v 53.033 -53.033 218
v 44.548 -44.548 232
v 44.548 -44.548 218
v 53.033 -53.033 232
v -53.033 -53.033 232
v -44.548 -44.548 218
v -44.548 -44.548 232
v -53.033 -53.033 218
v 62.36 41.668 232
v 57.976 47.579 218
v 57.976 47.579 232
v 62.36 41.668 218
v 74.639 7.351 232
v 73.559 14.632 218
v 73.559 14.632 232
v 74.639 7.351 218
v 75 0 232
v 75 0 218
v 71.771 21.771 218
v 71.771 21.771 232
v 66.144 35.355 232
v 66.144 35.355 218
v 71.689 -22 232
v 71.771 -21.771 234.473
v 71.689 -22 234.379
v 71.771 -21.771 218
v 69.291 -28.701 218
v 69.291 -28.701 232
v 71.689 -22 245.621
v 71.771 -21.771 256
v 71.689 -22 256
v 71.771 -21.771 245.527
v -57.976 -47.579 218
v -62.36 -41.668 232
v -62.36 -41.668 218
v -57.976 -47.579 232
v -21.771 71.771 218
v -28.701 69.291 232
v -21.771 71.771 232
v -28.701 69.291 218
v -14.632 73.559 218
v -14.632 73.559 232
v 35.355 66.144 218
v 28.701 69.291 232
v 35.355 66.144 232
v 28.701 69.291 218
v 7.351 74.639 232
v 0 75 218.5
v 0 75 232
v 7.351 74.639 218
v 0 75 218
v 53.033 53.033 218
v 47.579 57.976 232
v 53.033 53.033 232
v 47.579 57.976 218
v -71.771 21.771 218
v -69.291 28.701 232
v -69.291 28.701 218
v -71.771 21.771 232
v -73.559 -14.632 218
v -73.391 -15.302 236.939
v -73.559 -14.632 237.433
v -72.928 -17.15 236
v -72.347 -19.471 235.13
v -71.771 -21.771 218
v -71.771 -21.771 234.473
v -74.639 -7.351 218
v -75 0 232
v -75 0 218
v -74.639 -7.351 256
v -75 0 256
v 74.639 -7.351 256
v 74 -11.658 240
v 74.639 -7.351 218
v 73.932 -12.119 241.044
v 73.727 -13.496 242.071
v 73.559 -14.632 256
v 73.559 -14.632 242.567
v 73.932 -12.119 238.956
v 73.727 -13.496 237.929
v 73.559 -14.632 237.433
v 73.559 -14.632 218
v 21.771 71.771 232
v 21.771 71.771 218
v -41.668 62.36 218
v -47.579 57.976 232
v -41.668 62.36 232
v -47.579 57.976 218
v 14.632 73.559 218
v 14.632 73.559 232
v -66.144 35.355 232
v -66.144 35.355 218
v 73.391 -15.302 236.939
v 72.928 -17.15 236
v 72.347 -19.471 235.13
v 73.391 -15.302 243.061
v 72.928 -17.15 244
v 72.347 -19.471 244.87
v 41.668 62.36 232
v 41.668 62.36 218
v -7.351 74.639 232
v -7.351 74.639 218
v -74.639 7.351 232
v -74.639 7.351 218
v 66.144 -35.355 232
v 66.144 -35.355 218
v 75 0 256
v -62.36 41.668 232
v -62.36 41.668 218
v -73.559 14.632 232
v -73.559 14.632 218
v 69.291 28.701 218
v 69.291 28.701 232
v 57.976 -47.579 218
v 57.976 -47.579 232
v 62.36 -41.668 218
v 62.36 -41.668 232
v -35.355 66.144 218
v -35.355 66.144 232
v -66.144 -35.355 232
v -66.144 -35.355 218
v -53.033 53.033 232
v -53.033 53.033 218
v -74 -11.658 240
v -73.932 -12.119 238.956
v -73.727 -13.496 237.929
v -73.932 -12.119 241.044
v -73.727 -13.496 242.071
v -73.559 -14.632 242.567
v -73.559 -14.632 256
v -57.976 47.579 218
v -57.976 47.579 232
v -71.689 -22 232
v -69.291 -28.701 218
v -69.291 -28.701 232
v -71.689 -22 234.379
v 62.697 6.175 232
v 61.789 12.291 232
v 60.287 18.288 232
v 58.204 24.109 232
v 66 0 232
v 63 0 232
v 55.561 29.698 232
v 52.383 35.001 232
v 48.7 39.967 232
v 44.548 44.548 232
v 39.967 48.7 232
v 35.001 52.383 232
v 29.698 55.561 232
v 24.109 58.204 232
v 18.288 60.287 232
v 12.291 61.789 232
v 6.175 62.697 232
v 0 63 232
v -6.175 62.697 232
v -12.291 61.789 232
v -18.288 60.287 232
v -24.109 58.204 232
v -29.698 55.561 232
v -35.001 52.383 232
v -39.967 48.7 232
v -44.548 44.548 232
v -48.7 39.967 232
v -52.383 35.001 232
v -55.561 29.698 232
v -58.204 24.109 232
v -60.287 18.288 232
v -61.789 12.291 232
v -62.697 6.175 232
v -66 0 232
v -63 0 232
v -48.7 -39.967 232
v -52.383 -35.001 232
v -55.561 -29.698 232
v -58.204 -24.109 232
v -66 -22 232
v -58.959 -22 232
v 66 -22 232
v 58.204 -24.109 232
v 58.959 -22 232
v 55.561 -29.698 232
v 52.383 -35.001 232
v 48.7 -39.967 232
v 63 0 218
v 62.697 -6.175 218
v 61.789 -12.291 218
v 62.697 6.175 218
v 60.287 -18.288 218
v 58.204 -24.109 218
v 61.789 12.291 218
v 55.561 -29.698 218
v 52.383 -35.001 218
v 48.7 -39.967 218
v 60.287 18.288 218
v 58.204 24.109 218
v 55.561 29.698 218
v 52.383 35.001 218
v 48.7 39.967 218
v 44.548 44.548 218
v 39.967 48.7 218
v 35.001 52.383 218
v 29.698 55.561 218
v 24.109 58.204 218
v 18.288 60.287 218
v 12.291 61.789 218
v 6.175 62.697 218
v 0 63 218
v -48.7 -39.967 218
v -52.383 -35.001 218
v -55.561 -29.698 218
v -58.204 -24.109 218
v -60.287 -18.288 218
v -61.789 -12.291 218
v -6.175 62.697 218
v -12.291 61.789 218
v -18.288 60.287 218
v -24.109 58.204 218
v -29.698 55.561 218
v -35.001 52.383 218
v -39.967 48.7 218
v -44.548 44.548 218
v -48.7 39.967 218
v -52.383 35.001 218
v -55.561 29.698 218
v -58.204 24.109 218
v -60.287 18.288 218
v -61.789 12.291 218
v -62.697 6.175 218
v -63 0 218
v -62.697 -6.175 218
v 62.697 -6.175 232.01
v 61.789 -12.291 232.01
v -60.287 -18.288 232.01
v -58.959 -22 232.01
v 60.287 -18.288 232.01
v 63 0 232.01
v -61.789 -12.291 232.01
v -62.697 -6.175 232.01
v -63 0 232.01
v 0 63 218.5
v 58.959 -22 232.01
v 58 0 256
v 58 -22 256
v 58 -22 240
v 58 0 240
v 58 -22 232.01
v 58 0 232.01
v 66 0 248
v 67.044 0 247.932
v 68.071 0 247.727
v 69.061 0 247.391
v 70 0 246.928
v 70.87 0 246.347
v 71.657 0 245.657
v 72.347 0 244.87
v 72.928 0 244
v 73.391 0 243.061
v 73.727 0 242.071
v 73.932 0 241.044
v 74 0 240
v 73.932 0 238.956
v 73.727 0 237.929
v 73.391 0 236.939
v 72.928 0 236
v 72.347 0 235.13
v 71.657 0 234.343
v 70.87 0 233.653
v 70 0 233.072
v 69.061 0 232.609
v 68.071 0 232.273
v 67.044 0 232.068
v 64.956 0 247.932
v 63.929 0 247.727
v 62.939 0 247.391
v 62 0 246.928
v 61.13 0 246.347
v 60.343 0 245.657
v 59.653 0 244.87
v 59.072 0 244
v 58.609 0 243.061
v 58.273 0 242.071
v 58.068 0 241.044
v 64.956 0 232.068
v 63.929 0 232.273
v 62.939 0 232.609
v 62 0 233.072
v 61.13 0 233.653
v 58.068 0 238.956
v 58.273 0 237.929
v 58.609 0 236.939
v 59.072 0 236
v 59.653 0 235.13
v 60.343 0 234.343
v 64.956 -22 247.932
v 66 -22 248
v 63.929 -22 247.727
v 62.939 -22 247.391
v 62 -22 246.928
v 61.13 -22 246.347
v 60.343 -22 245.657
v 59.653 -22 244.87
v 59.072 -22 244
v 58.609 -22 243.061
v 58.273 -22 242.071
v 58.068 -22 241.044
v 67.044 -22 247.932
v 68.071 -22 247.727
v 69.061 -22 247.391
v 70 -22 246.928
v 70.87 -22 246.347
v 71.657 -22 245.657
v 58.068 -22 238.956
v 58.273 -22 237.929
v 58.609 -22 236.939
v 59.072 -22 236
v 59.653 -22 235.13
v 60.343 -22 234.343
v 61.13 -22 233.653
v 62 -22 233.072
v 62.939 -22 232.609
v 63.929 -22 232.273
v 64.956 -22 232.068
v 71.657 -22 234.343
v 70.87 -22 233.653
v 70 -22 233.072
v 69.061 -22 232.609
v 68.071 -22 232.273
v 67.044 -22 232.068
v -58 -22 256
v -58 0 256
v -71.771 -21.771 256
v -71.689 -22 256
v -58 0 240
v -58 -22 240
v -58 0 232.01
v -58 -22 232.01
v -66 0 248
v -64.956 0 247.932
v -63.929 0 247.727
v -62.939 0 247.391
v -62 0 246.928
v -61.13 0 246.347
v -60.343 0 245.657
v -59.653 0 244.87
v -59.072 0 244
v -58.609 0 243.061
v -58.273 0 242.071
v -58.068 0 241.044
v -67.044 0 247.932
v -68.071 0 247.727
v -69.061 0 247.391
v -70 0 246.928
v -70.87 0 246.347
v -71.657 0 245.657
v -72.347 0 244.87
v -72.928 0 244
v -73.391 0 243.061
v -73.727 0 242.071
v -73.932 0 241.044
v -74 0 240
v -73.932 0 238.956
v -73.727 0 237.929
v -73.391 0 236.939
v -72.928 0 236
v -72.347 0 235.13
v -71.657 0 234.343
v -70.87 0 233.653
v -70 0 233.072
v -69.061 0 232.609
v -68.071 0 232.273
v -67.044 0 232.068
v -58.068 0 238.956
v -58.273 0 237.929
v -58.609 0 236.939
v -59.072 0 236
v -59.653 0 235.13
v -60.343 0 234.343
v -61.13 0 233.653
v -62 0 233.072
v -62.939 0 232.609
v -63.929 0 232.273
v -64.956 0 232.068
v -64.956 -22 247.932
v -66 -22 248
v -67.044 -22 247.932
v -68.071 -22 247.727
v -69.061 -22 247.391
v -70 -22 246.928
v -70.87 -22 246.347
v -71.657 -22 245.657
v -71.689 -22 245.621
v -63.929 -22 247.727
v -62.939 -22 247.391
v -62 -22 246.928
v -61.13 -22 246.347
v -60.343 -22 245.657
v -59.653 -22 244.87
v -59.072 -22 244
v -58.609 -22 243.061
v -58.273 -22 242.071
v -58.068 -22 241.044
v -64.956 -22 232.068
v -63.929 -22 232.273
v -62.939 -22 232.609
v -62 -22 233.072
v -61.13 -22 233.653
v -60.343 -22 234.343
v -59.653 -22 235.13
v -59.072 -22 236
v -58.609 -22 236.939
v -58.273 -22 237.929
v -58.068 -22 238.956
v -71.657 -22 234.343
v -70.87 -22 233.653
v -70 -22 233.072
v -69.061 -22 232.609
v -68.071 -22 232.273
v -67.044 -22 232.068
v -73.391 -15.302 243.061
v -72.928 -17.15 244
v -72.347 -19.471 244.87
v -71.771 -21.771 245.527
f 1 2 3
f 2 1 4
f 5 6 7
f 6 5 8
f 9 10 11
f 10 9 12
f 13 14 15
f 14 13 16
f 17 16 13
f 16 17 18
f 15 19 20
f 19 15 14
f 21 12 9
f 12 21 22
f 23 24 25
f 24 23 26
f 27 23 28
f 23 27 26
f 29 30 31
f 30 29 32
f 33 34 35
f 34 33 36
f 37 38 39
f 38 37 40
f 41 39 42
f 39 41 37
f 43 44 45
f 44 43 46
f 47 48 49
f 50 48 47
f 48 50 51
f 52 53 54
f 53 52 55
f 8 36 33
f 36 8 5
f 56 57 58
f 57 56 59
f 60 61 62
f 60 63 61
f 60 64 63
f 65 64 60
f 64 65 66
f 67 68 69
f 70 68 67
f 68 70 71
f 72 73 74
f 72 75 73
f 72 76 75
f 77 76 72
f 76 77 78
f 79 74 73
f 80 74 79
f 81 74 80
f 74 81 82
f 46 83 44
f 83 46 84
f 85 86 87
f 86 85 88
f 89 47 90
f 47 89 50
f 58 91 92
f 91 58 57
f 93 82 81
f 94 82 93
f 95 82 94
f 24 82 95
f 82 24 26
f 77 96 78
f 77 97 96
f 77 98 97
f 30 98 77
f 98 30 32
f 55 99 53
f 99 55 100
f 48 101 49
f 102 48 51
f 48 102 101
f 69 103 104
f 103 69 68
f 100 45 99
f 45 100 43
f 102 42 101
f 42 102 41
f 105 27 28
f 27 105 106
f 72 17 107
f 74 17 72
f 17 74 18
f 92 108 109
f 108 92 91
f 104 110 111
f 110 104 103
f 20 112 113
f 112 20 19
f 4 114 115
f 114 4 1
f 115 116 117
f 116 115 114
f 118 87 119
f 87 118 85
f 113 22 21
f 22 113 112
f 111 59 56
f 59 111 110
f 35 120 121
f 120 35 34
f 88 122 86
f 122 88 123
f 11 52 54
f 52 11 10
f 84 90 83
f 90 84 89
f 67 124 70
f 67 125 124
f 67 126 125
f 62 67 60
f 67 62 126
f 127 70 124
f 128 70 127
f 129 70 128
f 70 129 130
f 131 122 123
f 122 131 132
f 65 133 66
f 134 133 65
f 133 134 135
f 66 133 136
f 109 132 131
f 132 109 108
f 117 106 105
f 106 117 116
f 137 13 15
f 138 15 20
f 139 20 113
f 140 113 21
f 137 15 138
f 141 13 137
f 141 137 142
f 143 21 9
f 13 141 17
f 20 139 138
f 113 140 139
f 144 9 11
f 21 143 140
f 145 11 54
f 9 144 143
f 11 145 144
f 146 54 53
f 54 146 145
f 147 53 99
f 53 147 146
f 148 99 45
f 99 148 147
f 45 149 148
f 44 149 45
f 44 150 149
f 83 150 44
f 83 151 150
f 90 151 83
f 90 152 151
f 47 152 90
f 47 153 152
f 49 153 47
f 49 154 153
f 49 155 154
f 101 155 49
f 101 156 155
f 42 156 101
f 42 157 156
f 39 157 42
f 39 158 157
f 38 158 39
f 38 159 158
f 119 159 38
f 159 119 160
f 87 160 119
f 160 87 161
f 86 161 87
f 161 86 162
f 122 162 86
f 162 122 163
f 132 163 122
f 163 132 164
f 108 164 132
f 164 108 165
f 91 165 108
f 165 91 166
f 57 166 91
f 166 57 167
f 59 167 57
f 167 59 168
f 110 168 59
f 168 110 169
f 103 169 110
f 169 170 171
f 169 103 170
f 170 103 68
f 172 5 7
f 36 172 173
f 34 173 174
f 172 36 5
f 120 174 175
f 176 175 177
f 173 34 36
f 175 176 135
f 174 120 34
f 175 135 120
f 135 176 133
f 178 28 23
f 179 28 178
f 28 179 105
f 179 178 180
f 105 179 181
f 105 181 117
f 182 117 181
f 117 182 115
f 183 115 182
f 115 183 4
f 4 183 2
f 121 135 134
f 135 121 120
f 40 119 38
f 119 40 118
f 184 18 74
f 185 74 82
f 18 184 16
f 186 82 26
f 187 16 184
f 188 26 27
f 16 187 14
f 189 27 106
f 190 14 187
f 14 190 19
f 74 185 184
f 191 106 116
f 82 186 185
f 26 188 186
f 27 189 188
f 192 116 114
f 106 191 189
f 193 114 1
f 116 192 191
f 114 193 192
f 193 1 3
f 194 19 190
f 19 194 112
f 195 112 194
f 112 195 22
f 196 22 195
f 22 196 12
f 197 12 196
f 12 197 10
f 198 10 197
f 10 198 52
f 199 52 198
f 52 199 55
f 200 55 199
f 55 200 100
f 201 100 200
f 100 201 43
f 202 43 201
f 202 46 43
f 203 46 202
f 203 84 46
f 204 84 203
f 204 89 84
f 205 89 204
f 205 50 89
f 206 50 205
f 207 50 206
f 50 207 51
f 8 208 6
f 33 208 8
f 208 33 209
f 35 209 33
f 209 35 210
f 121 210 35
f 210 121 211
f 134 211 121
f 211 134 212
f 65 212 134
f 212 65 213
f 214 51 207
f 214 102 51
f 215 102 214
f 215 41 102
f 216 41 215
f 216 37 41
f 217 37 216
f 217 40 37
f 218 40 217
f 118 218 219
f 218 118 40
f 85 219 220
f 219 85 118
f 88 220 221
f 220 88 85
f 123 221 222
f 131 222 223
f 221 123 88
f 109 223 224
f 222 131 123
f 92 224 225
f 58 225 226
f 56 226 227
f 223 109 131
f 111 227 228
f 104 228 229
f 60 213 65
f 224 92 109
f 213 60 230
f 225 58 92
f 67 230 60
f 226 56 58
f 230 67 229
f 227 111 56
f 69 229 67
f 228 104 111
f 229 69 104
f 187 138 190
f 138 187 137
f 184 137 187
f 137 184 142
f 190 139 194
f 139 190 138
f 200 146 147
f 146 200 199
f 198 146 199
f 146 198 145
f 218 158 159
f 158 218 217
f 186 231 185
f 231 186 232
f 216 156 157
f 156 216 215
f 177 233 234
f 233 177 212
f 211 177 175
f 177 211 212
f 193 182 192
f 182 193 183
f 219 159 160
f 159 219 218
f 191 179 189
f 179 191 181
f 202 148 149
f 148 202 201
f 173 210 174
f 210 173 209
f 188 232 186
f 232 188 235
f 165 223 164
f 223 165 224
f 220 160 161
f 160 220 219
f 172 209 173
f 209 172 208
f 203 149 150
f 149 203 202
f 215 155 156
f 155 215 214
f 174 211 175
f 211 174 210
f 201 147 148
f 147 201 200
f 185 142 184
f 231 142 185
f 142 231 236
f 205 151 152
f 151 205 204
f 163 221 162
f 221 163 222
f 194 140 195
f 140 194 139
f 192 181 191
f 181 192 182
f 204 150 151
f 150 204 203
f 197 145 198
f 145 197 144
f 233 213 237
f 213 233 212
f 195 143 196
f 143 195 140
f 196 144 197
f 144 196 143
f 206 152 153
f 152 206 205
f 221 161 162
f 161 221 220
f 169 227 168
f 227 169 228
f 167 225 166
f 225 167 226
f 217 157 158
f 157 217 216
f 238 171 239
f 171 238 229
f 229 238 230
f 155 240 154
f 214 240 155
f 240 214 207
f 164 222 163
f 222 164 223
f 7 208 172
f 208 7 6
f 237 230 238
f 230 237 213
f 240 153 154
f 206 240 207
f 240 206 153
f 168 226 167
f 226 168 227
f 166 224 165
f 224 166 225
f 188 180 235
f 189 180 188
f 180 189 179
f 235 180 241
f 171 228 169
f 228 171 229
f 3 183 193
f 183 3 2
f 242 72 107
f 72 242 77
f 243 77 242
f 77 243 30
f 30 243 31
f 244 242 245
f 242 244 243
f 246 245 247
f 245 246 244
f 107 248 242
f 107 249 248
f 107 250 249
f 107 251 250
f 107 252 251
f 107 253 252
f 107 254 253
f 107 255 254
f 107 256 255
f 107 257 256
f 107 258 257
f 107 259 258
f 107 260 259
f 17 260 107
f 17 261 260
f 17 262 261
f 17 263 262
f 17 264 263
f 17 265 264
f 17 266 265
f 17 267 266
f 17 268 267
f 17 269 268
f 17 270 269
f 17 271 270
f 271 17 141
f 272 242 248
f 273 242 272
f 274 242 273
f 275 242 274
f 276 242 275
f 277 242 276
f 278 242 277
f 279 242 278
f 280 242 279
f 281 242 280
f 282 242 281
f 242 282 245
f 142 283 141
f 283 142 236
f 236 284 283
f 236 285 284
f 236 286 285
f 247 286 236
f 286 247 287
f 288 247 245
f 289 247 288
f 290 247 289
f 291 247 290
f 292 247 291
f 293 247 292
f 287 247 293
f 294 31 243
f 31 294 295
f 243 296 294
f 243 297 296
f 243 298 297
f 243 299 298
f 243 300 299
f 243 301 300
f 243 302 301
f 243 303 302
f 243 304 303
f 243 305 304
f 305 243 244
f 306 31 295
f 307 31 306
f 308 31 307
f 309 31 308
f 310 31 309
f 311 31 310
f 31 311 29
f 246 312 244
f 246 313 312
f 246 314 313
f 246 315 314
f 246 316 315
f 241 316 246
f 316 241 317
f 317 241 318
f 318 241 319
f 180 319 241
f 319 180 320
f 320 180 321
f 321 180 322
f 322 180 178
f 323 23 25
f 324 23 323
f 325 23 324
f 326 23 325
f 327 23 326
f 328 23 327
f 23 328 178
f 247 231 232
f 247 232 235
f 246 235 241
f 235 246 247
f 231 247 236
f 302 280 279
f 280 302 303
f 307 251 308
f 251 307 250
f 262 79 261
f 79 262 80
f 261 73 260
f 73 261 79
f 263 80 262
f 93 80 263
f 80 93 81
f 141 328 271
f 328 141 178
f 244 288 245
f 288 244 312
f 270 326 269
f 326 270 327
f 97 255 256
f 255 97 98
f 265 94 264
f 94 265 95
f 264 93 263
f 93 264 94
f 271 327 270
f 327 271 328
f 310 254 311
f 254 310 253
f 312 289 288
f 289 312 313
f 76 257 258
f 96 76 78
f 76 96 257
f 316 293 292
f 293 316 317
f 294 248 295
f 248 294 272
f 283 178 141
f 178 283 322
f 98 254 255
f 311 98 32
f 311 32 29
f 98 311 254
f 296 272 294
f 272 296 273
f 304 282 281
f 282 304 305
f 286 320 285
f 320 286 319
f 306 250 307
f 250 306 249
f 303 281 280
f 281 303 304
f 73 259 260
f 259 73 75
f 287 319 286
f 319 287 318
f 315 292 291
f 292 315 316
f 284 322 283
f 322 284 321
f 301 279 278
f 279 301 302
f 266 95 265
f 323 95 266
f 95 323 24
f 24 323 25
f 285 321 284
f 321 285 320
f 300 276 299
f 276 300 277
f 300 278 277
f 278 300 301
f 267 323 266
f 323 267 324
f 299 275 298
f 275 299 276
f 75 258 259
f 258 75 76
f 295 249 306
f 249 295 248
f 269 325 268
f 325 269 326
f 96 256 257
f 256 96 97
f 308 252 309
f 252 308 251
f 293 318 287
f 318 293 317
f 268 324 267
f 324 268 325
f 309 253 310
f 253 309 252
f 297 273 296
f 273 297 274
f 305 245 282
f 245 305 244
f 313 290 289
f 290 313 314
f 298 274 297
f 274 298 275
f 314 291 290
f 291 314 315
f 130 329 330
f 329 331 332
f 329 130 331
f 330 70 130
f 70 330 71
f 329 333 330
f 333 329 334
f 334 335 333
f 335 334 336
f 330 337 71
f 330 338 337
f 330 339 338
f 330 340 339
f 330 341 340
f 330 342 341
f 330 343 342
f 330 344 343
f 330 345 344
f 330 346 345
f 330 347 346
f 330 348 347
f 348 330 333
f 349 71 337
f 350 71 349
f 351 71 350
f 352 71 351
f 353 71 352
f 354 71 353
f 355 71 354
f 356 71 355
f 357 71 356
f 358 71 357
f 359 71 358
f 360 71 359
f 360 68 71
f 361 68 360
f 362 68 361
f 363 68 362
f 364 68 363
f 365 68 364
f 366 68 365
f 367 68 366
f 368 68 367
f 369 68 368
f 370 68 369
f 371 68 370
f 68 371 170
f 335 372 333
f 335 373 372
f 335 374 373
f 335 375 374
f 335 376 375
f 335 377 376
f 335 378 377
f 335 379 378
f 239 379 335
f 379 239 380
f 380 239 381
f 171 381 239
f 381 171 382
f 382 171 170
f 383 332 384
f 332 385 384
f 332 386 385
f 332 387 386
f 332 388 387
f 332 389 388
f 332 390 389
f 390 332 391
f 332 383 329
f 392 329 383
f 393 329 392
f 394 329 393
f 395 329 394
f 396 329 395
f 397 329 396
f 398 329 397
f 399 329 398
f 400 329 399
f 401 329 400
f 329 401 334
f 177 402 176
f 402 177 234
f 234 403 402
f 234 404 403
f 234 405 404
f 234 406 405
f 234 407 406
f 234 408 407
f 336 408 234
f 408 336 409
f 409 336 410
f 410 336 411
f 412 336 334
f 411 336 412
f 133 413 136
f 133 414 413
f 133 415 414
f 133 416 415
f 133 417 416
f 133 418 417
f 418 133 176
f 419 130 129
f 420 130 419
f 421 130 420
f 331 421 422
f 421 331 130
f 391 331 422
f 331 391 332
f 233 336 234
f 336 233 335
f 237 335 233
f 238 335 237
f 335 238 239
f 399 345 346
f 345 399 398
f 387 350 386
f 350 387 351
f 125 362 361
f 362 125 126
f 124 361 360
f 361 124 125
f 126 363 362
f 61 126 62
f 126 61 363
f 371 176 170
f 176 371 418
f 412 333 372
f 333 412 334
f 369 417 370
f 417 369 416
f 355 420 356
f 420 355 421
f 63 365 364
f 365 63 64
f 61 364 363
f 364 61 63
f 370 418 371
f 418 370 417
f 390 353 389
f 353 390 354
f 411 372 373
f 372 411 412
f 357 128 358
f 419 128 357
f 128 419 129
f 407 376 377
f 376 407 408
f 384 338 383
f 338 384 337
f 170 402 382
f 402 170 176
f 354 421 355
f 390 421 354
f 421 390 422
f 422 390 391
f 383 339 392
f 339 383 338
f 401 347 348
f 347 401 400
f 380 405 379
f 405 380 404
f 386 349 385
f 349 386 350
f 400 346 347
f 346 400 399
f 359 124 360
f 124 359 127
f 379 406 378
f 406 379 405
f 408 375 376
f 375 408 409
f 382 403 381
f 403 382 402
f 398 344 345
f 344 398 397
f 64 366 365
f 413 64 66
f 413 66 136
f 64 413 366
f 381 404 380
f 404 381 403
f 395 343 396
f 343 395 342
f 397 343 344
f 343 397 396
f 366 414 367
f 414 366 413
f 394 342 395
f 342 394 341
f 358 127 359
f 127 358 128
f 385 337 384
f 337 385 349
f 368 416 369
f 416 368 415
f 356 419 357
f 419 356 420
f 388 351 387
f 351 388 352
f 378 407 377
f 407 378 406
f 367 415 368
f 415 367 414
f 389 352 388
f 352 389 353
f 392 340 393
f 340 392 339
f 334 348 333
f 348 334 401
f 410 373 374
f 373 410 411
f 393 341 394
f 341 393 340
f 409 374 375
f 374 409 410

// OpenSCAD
// =====================================================================
// child_top_crown.scad — 子機 トップクラウン (吊り耳 ×2 一体 + ドーム根元カラー)
//
// docs/子機外装_改善要件.md §3.5 (G2/G4, C3)。`child_lug` ×2 を置き換える。
// コアフレームの吊り耳ボス (頂面 z=218、M5 熱圧入インサート ×4 @ x=±lug_x,
// y=lug_bolt_y) に M5 ×4 で載る。ドーム押えリング (wte4_dome_cap, OD=dome_ring_od
// 仮 120.3、座面 z=208) を囲む C 形カラーと、左右の吊り耳 (シャックル Ø16) を
// 一体化した部品。**ドーム上半球は覆わない** (C3, 将来 LED で照らす)。
//
// 座標系: 機体グローバル (チューブ軸=Z, z=0 チューブ下端, +Y=前)。
// 取合い (二重定義。child_core_frame.scad と一致させること):
//   lug_x = 66 / lug_bolt_y = [-4,-16] / 台座取付面 z = 218 (frame_z1)
//   dome_ring_od = 120.3 (child_core_frame / child_jaw_gate と同じ仮値)
//   パイロン屋根 y -101..-50 / z 182..190 (child_core_frame, 干渉しない高さ差)
//   xdcr_socket 座 中心 (0, -75)、外径 ~36 (r18) 高さ38 → 上端 z228
//     (child_core_frame xd_cy / xd_p, xdcr_socket.md)
// ゲート (可動側、y>=0) 頂面も z218 なので、y>0 領域は z>=218.5 に浮かせて
// 開閉時に擦らないようにする。
//
// 荷重: L1 吊り 99N/耳 (全備 5.7kg x 3g, ブライドル ~30°) / L2 輸送 300N
// (2026-09-04 緩和, 5g)。quick_strength で確認 (このファイル末尾コメント参照)。
//   lug  (シャックル穴 ベアリング/ネット断面/ティアアウト): hole16 edge10 t22
//     F=300N -> 0.68/0.85/0.68 MPa (limit 12/18/7.2) PASS
//     F=99N  -> さらに余裕 PASS
//   beam (耳根元 曲げ、L=22 (根元→シャックル穴中心), b=22(y), t=17(x)):
//     F=300N -> 曲げ 6.23 MPa (limit 12) / たわみ 0.127mm (limit 1) PASS
//     F=99N  -> PASS (さらに余裕)
//   ※ シャックル穴中心は当初案 z=248 から z=240 に下げてある。z248/Φ16 だと
//     穴の上端がちょうど耳上端 z=256 と一致し実質マージン 0 になるため
//     (child_lug の assert はこの base_t 二重加算バグで見かけ上 8mm と出ていた)。
//     z=240 なら上端マージン 8mm・下端 (台座天面 z=222) までも 10mm 確保できる。
//
// 印刷: 左右の耳は .scad 内で mirror([1,0,0]) して 1 部品 (STL 1 個) にまとめて
// ある (placement.json ではミラー不要、1 インスタンスを配置するだけでよい)。
// カラー (単独円環) は +Z 直立で層がフープ荷重に沿う。耳板のシャックル穴軸=Y・
// 主荷重(Z 方向近似)は層面内にならないので、耳の根元断面は layer-across
// (量子 12MPa) で評価している (十分な安全率で PASS、上記コメント参照)。
// 1 部品で印刷 (+Z up)。耳の張り出しは下部が r63..75 の環状部に連続しており
// オーバーハングは目視で確認 (printability.py 参照)。
// =====================================================================

/* [取付 (child_core_frame と二重定義)] */
lug_x      = 66;          // 耳ボルト列の x (±)
lug_bolt_y = [-4, -16];   // M5 ×2 (机体 y)
mount_z    = 218;         // 台座取付面 (= frame_z1)

/* [ドーム根元カラー] */
dome_ring_od = 120.3;      // 押えリング OD (仮。child_core_frame/child_jaw_gate と同じ)
r_in       = 63;           // カラー内径 = Ø126
r_out      = 75;           // カラー外径 = Ø150 (<= 152 上限)
ring_z0    = 218;          // カラー下端 (機体固定側、y<=0)
ring_z1    = 232;          // カラー上端 (高さ 14)
front_raise = 0.5;         // y>0 (ゲート側) は下端をこれだけ浮かせる
aft_az0    = 225;          // 後方カットアウト (xdcr_socket 逃げ) 開始方位角
aft_az1    = 315;          // 終了方位角 (-Y ±45°)

/* [xdcr_socket / パイロン 逃げ確認用 (child_core_frame と二重定義)] */
xd_cx      = 0;
xd_cy      = -75;
xd_r_clear = 21;           // ソケット半径 ~18 + 余裕3
pyl_roof_z1 = 190;         // パイロン屋根上端

/* [吊り耳]  local: x = lug_x を中心に -8..+9 (機体 x = 58..75) */
ear_x0     = 58;           // 耳 内側端 (機体 x)
ear_x1     = 75;           // 耳 外側端 (= r_out)
ear_y0     = -22;          // 耳 奥行 (フレームボスと同じ y -22..0)
ear_y1     = 0;
ear_z1     = 256;          // 耳上端 <= 256 (ドーム頂点 261.25 手前)
foot_z1    = 222;          // 台座 (M5 クリアランス穴の厚み) z218..222
bolt_d     = 5.4;          // M5 クリアランス穴
hole_d     = 16;           // シャックル穴 (Ø10 ロープ / M10 シャックル)
hole_z     = 240;          // シャックル穴中心 (機体 z)

/* [輸送キャップ用インサート (child_dome_cap_transport と二重定義)] */
cap_bolt_x = 75;           // = ear_x1 (耳外側面)
cap_bolt_z = 227;          // 台座 (222) とシャックル穴下端 (232) の中間
cap_ins_d  = 6.4;          // M5 熱圧入インサート下穴
cap_ins_len = 9;

/* [Hidden] */
fudge = 0.01;
$fn = 64;

// ---- 検査 --------------------------------------------------------------
assert(2*r_in > dome_ring_od + 5,
       "カラー内径がドーム押えリング OD+5 を割り込む");
assert(ear_z1 <= 256, "耳上端が 256 を超える (ドーム頂点手前を割り込む)");
assert(hole_z - hole_d/2 - foot_z1 >= 6, "シャックル穴下端と台座の距離不足");
assert(ear_z1 - (hole_z + hole_d/2) >= 6, "シャックル穴上端と耳上端の距離不足");
assert(hole_z - hole_d/2 - cap_bolt_z >= 3, "キャップインサートとシャックル穴が近すぎる");
assert(cap_bolt_z - foot_z1 >= 3, "キャップインサートと台座が近すぎる");
assert(2*max(r_out, ear_x1) <= 152, "クラウン全幅が 152 を超える");
assert(ring_z0 > pyl_roof_z1, "カラー下端がパイロン屋根より低い");
assert(front_raise >= 0.5, "ゲート側クリアランスが 0.5mm 未満");
// アフトカットアウトの端 (r_out, aft_az0) から xdcr_socket 中心までの距離
aft_edge_x = r_out * cos(aft_az0);
aft_edge_y = r_out * sin(aft_az0);
aft_edge_dist = sqrt(pow(aft_edge_x - xd_cx, 2) + pow(aft_edge_y - xd_cy, 2));
assert(aft_edge_dist >= xd_r_clear,
       str("アフトカットアウト端が xdcr_socket に近すぎる: ", aft_edge_dist));
echo(str("aft_edge_dist(machine mm) = ", aft_edge_dist));
echo(str("crown 全幅 = ", 2*max(r_out, ear_x1), " / 耳上端 = ", ear_z1));

// ---- モジュール ----------------------------------------------------------
// 方位角 az0..az1 (deg, 0=+X, 90=+Y) の全径ウェッジ
module wedge(az0, az1, z0, h) {
    intersection() {
        rotate([0, 0, az0]) translate([0, 0, z0]) cube([400, 400, h]);
        rotate([0, 0, az1 - 90]) translate([0, 0, z0 - fudge]) cube([400, 400, h + 2*fudge]);
    }
}

module ear() {
    difference() {
        intersection() {
            // 箱: x [ear_x0..ear_x1] (機体 sx*lug_x を中心に外へ広げる) を
            // sx=-1 側は鏡像するので、ローカル形状は常に「外向き = +x 側」で作る
            translate([ear_x0, ear_y0, mount_z])
                cube([ear_x1 - ear_x0, ear_y1 - ear_y0, ear_z1 - mount_z]);
            // 外径 r_out を超える角 (y=-22 側) を丸める (カラーと同じ包絡に収める)
            translate([0, 0, mount_z - fudge]) cylinder(r = r_out, h = ear_z1 - mount_z + 2*fudge);
        }
        // ドーム/カラー内径の逃げ (z218..232 のみ有効。それ以上は自然と離れる)
        translate([0, 0, ring_z0 - fudge]) cylinder(r = r_in, h = (ring_z1 - ring_z0) + 2*fudge);
        // M5 クリアランス穴 (台座、機体 x=lug_x, y=lug_bolt_y)
        for (yy = lug_bolt_y)
            translate([lug_x, yy, mount_z - fudge])
                cylinder(d = bolt_d, h = foot_z1 - mount_z + 2*fudge, $fn = 32);
        // シャックル穴 (軸 Y、機体 x=lug_x, z=hole_z)
        translate([lug_x, ear_y0 - fudge, hole_z])
            rotate([-90, 0, 0]) cylinder(d = hole_d, h = (ear_y1 - ear_y0) + 2*fudge, $fn = 48);
        // 輸送キャップ用 M5 インサート下穴 (軸 X、外側面 x=cap_bolt_x から内向きに)
        translate([cap_bolt_x + fudge, (ear_y0 + ear_y1)/2, cap_bolt_z])
            rotate([0, -90, 0]) cylinder(d = cap_ins_d, h = cap_ins_len + fudge, $fn = 32);
    }
}

// ---- 形状 ---------------------------------------------------------------
union() {
    // カラー (C 形リング、アフトカットアウトあり、ゲート側 0.5mm 浮かせ)
    difference() {
        translate([0, 0, ring_z0]) cylinder(r = r_out, h = ring_z1 - ring_z0);
        translate([0, 0, ring_z0 - fudge]) cylinder(r = r_in, h = (ring_z1 - ring_z0) + 2*fudge);
        wedge(aft_az0, aft_az1, ring_z0 - fudge, (ring_z1 - ring_z0) + 2*fudge);
        // ゲート側 (y>0, az 0..180) の下端スライバを除去 -> 底面が 218.5 になる
        intersection() {
            wedge(0, 180, ring_z0 - fudge, front_raise + fudge);
            translate([-r_out - 1, -1, ring_z0 - fudge]) cube([2*r_out + 2, r_out + 2, front_raise + 2*fudge]);
        }
    }
    // 吊り耳 ×2 (機体 x=+lug_x と x=-lug_x を同一 .scad 内で mirror して 1 部品化)
    ear();
    mirror([1, 0, 0]) ear();
}
